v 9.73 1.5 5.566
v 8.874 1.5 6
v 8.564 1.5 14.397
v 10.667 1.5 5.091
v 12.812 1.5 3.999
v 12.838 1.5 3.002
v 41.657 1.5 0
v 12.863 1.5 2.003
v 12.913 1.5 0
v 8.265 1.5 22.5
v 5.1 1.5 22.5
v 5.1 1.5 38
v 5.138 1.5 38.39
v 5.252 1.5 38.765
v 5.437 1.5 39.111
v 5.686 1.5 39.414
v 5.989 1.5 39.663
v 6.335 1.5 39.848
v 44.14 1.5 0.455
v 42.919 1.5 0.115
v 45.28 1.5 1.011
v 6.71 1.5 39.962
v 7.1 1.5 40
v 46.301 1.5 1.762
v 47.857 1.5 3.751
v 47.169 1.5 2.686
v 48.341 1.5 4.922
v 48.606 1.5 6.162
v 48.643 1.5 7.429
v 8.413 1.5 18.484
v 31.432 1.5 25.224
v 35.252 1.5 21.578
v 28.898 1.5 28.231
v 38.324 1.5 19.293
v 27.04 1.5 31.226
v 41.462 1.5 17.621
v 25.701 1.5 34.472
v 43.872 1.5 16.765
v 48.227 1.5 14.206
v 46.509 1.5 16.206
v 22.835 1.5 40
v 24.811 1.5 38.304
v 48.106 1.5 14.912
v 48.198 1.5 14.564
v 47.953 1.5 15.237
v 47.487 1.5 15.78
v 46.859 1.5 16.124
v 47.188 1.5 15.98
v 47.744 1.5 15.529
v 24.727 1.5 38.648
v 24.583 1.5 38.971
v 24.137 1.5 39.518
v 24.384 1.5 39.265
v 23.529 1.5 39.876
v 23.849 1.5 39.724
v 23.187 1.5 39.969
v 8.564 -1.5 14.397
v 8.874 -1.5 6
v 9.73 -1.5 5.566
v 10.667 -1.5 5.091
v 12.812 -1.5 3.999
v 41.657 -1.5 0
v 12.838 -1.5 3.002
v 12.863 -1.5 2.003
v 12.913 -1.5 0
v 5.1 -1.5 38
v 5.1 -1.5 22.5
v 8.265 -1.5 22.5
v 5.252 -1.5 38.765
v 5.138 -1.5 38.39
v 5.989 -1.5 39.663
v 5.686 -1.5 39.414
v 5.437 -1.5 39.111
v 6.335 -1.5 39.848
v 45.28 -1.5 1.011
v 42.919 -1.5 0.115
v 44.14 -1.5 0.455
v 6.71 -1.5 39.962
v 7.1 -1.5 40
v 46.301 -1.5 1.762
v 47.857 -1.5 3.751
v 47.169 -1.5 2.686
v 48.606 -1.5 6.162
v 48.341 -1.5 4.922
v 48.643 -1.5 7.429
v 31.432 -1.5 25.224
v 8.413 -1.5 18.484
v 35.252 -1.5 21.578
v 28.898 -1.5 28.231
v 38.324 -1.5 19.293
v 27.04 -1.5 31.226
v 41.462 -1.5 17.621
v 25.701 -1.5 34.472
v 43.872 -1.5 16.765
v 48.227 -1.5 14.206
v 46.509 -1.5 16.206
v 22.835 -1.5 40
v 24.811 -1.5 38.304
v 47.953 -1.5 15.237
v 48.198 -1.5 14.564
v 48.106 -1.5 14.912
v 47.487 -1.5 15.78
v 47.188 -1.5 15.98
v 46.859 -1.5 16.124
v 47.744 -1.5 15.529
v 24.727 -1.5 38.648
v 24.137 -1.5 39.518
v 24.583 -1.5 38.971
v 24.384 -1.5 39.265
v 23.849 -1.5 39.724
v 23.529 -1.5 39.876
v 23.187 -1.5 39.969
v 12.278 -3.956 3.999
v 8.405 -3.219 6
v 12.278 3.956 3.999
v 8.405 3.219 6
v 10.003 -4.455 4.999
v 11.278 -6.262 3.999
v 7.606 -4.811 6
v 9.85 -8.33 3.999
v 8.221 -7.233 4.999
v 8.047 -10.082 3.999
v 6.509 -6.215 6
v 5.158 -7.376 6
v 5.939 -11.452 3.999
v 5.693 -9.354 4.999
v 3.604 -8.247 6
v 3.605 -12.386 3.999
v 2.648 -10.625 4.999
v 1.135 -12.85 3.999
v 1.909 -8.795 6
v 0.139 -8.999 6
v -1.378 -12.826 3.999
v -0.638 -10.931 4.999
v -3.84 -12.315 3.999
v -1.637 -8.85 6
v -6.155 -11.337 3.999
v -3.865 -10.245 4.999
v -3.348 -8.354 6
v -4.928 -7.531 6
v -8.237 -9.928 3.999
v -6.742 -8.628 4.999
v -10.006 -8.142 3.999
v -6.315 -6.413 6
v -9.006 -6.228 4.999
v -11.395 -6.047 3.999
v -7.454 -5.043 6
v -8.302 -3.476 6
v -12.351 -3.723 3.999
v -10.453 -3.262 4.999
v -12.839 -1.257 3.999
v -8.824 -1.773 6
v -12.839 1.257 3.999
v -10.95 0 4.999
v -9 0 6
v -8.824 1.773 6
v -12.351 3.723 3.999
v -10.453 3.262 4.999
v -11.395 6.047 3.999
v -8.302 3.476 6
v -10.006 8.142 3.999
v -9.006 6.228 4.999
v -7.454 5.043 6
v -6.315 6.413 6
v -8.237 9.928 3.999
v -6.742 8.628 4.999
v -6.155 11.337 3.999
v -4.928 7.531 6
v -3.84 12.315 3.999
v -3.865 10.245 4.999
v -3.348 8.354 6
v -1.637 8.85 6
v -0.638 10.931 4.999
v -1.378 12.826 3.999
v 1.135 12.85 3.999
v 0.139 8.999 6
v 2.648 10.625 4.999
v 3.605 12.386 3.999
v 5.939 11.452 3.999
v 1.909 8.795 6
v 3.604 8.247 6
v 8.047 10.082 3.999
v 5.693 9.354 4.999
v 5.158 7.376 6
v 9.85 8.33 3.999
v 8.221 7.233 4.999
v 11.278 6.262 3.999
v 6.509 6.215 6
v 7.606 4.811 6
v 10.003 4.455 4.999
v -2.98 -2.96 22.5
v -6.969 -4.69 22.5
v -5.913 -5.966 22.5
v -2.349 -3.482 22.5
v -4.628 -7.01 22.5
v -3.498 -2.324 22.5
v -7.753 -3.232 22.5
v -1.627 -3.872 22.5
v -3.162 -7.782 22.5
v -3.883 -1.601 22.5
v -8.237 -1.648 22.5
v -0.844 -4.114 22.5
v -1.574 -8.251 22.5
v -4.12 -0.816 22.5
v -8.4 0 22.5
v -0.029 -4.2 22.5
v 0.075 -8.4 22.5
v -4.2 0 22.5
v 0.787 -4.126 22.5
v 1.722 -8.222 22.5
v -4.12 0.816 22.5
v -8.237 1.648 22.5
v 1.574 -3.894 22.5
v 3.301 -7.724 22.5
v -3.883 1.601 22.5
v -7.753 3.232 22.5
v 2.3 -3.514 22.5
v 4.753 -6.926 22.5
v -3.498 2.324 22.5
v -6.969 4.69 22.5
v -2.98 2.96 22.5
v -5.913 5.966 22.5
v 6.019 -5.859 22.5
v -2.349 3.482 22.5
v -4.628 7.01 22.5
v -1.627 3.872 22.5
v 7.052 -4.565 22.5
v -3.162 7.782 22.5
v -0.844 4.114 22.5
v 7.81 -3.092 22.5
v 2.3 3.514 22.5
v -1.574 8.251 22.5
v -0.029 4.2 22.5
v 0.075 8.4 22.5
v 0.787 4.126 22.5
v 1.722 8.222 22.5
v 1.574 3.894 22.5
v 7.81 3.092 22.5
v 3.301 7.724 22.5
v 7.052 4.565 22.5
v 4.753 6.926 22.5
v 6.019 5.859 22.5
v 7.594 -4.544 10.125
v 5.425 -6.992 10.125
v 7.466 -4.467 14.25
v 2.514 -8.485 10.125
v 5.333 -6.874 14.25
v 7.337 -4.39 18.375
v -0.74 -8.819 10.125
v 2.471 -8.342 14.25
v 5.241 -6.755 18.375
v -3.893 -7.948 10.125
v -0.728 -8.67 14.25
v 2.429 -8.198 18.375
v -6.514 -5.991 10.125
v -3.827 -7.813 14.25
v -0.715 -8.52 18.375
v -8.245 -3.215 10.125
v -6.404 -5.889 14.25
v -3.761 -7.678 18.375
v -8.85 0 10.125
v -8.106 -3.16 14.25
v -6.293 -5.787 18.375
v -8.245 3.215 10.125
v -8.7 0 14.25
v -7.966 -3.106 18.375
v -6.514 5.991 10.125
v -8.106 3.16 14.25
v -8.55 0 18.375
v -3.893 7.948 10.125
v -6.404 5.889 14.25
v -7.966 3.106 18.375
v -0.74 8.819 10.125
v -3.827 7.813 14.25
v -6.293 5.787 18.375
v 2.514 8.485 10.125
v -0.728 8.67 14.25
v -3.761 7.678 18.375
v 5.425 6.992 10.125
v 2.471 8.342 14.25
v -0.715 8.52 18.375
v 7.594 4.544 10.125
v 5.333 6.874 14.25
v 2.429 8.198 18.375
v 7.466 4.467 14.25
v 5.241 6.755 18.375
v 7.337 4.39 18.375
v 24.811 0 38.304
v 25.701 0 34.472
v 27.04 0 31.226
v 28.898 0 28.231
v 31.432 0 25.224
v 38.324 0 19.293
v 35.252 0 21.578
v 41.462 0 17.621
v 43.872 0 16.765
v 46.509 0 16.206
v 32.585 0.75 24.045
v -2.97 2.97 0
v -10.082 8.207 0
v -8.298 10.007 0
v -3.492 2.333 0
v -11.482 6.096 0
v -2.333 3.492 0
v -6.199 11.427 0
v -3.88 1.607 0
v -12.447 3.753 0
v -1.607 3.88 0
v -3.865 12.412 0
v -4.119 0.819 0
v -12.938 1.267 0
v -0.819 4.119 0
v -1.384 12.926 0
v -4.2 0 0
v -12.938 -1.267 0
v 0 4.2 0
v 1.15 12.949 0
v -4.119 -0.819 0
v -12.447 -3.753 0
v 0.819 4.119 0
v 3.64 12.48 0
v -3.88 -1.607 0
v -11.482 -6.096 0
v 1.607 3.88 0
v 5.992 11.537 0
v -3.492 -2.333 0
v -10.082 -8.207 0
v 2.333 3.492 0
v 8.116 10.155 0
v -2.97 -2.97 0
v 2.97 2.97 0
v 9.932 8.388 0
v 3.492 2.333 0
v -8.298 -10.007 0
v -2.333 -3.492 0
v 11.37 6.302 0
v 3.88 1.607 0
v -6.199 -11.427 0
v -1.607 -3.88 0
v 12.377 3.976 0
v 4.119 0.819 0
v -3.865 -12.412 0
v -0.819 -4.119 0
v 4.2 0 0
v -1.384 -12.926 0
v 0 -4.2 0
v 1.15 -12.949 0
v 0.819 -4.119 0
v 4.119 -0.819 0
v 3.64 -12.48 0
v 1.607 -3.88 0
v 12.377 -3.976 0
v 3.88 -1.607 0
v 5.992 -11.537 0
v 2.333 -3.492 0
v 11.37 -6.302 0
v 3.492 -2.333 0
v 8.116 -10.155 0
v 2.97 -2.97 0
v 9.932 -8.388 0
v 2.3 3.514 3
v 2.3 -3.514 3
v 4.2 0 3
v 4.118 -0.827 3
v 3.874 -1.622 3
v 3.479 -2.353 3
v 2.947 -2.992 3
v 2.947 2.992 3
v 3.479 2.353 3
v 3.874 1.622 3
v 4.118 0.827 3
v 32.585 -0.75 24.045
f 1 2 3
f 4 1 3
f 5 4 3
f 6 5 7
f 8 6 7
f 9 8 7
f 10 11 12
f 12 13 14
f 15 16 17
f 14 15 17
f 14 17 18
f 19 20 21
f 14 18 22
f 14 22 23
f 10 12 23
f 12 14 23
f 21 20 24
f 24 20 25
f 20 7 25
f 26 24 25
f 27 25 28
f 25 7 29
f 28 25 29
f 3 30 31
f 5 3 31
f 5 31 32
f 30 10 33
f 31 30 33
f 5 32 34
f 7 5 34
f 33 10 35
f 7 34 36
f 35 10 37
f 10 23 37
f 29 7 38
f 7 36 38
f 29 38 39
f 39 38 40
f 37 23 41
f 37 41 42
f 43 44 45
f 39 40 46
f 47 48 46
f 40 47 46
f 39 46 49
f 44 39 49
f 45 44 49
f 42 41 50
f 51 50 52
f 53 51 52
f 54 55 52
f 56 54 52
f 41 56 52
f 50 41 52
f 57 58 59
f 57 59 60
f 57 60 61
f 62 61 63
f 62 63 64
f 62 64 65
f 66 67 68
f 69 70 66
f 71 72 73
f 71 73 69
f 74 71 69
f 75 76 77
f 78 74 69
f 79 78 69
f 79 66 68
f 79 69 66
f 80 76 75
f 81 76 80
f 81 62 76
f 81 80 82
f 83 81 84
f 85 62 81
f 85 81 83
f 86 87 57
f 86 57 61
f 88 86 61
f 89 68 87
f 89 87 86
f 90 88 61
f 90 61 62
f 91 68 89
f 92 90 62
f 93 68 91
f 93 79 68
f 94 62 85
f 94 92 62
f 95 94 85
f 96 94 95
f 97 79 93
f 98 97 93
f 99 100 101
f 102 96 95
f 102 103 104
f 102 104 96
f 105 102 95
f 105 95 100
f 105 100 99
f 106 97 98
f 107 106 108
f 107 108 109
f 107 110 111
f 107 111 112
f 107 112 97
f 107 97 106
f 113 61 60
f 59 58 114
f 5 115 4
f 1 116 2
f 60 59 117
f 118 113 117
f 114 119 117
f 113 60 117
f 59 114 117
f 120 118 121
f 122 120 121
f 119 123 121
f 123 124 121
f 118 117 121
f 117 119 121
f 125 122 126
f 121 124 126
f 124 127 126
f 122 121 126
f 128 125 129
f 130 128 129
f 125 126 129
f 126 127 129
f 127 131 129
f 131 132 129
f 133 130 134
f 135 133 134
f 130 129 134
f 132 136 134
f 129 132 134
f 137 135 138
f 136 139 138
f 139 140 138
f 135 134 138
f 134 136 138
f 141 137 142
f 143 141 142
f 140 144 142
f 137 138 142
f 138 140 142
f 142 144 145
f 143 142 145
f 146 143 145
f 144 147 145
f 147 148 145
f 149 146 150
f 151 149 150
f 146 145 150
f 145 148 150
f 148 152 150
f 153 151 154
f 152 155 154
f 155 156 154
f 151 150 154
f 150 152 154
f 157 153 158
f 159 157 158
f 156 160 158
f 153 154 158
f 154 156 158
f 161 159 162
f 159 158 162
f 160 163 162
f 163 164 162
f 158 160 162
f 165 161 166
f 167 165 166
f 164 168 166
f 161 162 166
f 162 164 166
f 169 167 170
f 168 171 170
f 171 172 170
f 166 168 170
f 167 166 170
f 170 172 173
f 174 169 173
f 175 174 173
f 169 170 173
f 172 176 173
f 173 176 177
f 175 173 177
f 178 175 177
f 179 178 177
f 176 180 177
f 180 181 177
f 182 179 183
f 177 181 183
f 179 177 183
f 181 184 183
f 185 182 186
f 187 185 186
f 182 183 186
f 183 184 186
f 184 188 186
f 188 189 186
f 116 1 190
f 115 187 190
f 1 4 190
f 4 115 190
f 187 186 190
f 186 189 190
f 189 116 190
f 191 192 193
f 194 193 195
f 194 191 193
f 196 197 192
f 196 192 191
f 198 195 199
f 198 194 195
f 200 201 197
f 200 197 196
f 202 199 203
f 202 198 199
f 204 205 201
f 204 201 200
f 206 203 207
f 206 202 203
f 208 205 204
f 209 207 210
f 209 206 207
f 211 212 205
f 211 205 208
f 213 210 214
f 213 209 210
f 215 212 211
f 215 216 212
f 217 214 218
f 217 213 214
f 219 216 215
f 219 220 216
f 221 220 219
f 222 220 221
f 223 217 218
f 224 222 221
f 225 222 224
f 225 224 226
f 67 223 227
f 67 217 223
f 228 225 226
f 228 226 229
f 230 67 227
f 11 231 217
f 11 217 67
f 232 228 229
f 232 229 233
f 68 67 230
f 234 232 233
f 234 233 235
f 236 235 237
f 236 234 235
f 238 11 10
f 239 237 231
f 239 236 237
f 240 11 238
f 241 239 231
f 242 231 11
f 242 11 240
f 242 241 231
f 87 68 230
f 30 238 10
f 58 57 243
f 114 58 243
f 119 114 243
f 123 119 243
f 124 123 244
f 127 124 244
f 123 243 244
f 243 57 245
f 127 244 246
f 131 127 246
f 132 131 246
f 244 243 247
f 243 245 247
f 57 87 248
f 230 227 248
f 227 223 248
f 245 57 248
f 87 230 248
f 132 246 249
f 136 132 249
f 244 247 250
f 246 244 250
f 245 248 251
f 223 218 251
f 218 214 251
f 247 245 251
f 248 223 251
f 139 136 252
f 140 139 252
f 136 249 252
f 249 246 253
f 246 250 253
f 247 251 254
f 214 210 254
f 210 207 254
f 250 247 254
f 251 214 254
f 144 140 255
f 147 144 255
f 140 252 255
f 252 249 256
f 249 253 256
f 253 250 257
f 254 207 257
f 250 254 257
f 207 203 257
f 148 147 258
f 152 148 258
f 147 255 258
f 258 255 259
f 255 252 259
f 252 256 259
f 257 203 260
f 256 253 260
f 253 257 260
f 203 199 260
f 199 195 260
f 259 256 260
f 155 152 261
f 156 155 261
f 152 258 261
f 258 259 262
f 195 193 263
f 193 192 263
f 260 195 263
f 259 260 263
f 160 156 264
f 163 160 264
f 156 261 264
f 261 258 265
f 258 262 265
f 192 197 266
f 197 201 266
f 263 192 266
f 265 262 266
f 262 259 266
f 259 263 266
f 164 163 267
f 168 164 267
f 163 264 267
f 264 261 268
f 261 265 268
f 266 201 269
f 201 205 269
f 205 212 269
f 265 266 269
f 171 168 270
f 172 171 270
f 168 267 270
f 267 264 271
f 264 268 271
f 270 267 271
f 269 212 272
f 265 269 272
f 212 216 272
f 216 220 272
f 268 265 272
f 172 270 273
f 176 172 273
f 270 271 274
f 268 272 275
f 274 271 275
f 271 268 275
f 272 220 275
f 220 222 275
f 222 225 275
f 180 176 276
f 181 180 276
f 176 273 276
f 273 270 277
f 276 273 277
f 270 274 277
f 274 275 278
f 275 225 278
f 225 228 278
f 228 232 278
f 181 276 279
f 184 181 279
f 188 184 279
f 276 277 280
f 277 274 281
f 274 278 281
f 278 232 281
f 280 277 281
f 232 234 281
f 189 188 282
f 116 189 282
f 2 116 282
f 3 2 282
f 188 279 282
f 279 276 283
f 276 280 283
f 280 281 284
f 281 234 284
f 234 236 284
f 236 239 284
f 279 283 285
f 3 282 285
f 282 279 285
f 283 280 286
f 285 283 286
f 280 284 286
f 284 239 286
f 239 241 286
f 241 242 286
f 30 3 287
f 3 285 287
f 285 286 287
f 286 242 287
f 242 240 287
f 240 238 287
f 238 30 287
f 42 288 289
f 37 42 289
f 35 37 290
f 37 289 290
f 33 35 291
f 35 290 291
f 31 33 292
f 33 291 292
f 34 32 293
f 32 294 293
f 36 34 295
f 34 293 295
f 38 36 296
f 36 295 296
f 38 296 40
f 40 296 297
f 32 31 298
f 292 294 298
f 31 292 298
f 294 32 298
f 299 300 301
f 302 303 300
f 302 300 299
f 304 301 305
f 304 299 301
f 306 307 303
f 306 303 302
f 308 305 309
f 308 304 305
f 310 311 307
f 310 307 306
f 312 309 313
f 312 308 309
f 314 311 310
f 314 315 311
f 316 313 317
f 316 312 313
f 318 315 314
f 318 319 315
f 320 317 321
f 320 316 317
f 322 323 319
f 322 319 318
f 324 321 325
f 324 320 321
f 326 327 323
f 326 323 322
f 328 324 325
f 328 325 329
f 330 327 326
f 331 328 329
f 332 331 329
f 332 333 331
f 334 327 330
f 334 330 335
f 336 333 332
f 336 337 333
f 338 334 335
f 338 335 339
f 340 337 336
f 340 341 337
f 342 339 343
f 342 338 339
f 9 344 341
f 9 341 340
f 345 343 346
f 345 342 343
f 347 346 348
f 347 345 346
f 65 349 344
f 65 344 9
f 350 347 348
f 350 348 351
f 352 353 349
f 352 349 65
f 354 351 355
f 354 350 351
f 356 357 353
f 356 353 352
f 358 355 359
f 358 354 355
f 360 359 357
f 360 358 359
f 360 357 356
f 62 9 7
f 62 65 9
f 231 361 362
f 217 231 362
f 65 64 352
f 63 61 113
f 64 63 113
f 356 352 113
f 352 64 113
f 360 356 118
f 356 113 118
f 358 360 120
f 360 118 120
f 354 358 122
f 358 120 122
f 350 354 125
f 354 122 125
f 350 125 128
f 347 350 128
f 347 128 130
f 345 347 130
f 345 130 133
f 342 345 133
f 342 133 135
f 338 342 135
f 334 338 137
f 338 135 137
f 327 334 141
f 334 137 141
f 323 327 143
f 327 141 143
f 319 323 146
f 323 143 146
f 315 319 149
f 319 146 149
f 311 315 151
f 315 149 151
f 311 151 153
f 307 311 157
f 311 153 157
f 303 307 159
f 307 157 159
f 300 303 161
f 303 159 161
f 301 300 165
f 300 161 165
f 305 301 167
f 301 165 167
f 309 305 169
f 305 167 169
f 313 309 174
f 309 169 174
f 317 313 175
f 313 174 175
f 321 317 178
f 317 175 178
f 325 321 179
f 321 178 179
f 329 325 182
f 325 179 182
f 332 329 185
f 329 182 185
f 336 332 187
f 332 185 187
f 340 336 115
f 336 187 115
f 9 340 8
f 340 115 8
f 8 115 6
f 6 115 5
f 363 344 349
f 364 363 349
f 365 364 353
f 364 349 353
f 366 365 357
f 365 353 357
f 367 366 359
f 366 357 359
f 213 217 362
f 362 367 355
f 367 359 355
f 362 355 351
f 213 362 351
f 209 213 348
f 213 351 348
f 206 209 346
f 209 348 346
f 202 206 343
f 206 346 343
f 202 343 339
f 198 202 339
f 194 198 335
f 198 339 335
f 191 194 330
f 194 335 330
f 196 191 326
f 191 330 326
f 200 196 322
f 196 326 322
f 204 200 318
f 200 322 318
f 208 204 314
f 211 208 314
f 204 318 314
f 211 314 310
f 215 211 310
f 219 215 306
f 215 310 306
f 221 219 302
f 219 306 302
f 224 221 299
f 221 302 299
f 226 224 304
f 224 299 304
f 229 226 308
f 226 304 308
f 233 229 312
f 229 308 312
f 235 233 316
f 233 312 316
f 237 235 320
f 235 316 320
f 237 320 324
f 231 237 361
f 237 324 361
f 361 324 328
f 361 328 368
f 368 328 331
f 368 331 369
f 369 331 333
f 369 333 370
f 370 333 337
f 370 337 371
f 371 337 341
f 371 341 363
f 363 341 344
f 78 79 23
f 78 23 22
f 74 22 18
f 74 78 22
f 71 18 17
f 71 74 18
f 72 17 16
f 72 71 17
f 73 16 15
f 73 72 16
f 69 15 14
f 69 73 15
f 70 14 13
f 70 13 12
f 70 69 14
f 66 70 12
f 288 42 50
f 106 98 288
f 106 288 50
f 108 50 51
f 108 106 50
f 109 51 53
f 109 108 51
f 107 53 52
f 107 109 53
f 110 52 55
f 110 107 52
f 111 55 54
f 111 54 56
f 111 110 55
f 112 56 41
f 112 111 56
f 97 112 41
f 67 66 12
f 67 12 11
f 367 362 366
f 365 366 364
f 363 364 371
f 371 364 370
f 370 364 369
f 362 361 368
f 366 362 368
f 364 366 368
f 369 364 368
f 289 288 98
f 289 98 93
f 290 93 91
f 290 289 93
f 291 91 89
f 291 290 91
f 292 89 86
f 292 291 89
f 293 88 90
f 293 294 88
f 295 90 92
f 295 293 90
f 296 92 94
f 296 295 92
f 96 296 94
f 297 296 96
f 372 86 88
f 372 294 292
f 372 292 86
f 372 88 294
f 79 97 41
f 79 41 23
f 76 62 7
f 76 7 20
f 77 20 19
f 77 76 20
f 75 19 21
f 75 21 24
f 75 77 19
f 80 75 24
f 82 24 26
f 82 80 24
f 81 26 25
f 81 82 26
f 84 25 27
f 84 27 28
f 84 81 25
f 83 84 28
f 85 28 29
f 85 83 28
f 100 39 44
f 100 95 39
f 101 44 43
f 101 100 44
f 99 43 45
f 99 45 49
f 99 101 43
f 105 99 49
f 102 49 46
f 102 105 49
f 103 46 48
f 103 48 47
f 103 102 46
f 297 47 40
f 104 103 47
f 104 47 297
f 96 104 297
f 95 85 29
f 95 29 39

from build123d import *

# Parameters (mm, degrees)
F3_DEPTH = 1.5
F6_DEPTH = 19.5


with BuildPart() as f1:
    # F0 (on Front) → F1 (revolve)
    with BuildSketch(Plane.XZ):
        Polygon((4.2, 22.5), (4.2, 0), (13, 0), (12.9, 3.9987498046), (9, 6), (8.4, 22.5), align=None)
    revolve(axis=Axis((0, 0, 11.0757909857), (0, 0, -1)))

    # F2 (on Front) → F3 (join, symmetric)
    with BuildSketch(Plane.XZ):
        with BuildLine():
            ThreePointArc((24.8114139417, 38.3041779305), (24.1369176585, 39.5179518867), (22.8346803262, 40))
            Line((22.8346803262, 40), (7.1, 40))
            ThreePointArc((7.1, 40), (5.6857864376, 39.4142135624), (5.1, 38))
            Line((5.1, 38), (5.1, 0))
            Line((5.1, 0), (41.6566307042, 0))
            ThreePointArc((41.6566307042, 0), (46.7559189862, 2.2044542524), (48.6434507718, 7.4293545666))
            Line((48.6434507718, 7.4293545666), (48.2270230711, 14.2058177569))
            ThreePointArc((48.2270230711, 14.2058177569), (47.7443600045, 15.5294895472), (46.5087443093, 16.2064862223))
            add(Edge.make_bspline(
                [(24.8114139417, 38.3041779305), (25.8400232101, 31.6196478767), (31.7867109711, 23.9952449135), (40.4234775152, 17.0719607824), (46.5087443093, 16.2064862223)],
                knots=[0.037485554, 0.037485554, 0.037485554, 0.037485554, 0.4963538741, 0.9396396059, 0.9396396059, 0.9396396059, 0.9396396059], degree=3))
        make_face()
    extrude(amount=F3_DEPTH, both=True)

    # F5 (on offset) → F6 (join)
    with BuildSketch(Plane.XY.offset(3)):
        with BuildLine():
            Line((2.3, 3.5142566782), (2.3, -3.5142566782))
            ThreePointArc((2.3, -3.5142566782), (4.2, 0), (2.3, 3.5142566782))
        make_face()
    extrude(amount=F6_DEPTH)


solid = f1.part
